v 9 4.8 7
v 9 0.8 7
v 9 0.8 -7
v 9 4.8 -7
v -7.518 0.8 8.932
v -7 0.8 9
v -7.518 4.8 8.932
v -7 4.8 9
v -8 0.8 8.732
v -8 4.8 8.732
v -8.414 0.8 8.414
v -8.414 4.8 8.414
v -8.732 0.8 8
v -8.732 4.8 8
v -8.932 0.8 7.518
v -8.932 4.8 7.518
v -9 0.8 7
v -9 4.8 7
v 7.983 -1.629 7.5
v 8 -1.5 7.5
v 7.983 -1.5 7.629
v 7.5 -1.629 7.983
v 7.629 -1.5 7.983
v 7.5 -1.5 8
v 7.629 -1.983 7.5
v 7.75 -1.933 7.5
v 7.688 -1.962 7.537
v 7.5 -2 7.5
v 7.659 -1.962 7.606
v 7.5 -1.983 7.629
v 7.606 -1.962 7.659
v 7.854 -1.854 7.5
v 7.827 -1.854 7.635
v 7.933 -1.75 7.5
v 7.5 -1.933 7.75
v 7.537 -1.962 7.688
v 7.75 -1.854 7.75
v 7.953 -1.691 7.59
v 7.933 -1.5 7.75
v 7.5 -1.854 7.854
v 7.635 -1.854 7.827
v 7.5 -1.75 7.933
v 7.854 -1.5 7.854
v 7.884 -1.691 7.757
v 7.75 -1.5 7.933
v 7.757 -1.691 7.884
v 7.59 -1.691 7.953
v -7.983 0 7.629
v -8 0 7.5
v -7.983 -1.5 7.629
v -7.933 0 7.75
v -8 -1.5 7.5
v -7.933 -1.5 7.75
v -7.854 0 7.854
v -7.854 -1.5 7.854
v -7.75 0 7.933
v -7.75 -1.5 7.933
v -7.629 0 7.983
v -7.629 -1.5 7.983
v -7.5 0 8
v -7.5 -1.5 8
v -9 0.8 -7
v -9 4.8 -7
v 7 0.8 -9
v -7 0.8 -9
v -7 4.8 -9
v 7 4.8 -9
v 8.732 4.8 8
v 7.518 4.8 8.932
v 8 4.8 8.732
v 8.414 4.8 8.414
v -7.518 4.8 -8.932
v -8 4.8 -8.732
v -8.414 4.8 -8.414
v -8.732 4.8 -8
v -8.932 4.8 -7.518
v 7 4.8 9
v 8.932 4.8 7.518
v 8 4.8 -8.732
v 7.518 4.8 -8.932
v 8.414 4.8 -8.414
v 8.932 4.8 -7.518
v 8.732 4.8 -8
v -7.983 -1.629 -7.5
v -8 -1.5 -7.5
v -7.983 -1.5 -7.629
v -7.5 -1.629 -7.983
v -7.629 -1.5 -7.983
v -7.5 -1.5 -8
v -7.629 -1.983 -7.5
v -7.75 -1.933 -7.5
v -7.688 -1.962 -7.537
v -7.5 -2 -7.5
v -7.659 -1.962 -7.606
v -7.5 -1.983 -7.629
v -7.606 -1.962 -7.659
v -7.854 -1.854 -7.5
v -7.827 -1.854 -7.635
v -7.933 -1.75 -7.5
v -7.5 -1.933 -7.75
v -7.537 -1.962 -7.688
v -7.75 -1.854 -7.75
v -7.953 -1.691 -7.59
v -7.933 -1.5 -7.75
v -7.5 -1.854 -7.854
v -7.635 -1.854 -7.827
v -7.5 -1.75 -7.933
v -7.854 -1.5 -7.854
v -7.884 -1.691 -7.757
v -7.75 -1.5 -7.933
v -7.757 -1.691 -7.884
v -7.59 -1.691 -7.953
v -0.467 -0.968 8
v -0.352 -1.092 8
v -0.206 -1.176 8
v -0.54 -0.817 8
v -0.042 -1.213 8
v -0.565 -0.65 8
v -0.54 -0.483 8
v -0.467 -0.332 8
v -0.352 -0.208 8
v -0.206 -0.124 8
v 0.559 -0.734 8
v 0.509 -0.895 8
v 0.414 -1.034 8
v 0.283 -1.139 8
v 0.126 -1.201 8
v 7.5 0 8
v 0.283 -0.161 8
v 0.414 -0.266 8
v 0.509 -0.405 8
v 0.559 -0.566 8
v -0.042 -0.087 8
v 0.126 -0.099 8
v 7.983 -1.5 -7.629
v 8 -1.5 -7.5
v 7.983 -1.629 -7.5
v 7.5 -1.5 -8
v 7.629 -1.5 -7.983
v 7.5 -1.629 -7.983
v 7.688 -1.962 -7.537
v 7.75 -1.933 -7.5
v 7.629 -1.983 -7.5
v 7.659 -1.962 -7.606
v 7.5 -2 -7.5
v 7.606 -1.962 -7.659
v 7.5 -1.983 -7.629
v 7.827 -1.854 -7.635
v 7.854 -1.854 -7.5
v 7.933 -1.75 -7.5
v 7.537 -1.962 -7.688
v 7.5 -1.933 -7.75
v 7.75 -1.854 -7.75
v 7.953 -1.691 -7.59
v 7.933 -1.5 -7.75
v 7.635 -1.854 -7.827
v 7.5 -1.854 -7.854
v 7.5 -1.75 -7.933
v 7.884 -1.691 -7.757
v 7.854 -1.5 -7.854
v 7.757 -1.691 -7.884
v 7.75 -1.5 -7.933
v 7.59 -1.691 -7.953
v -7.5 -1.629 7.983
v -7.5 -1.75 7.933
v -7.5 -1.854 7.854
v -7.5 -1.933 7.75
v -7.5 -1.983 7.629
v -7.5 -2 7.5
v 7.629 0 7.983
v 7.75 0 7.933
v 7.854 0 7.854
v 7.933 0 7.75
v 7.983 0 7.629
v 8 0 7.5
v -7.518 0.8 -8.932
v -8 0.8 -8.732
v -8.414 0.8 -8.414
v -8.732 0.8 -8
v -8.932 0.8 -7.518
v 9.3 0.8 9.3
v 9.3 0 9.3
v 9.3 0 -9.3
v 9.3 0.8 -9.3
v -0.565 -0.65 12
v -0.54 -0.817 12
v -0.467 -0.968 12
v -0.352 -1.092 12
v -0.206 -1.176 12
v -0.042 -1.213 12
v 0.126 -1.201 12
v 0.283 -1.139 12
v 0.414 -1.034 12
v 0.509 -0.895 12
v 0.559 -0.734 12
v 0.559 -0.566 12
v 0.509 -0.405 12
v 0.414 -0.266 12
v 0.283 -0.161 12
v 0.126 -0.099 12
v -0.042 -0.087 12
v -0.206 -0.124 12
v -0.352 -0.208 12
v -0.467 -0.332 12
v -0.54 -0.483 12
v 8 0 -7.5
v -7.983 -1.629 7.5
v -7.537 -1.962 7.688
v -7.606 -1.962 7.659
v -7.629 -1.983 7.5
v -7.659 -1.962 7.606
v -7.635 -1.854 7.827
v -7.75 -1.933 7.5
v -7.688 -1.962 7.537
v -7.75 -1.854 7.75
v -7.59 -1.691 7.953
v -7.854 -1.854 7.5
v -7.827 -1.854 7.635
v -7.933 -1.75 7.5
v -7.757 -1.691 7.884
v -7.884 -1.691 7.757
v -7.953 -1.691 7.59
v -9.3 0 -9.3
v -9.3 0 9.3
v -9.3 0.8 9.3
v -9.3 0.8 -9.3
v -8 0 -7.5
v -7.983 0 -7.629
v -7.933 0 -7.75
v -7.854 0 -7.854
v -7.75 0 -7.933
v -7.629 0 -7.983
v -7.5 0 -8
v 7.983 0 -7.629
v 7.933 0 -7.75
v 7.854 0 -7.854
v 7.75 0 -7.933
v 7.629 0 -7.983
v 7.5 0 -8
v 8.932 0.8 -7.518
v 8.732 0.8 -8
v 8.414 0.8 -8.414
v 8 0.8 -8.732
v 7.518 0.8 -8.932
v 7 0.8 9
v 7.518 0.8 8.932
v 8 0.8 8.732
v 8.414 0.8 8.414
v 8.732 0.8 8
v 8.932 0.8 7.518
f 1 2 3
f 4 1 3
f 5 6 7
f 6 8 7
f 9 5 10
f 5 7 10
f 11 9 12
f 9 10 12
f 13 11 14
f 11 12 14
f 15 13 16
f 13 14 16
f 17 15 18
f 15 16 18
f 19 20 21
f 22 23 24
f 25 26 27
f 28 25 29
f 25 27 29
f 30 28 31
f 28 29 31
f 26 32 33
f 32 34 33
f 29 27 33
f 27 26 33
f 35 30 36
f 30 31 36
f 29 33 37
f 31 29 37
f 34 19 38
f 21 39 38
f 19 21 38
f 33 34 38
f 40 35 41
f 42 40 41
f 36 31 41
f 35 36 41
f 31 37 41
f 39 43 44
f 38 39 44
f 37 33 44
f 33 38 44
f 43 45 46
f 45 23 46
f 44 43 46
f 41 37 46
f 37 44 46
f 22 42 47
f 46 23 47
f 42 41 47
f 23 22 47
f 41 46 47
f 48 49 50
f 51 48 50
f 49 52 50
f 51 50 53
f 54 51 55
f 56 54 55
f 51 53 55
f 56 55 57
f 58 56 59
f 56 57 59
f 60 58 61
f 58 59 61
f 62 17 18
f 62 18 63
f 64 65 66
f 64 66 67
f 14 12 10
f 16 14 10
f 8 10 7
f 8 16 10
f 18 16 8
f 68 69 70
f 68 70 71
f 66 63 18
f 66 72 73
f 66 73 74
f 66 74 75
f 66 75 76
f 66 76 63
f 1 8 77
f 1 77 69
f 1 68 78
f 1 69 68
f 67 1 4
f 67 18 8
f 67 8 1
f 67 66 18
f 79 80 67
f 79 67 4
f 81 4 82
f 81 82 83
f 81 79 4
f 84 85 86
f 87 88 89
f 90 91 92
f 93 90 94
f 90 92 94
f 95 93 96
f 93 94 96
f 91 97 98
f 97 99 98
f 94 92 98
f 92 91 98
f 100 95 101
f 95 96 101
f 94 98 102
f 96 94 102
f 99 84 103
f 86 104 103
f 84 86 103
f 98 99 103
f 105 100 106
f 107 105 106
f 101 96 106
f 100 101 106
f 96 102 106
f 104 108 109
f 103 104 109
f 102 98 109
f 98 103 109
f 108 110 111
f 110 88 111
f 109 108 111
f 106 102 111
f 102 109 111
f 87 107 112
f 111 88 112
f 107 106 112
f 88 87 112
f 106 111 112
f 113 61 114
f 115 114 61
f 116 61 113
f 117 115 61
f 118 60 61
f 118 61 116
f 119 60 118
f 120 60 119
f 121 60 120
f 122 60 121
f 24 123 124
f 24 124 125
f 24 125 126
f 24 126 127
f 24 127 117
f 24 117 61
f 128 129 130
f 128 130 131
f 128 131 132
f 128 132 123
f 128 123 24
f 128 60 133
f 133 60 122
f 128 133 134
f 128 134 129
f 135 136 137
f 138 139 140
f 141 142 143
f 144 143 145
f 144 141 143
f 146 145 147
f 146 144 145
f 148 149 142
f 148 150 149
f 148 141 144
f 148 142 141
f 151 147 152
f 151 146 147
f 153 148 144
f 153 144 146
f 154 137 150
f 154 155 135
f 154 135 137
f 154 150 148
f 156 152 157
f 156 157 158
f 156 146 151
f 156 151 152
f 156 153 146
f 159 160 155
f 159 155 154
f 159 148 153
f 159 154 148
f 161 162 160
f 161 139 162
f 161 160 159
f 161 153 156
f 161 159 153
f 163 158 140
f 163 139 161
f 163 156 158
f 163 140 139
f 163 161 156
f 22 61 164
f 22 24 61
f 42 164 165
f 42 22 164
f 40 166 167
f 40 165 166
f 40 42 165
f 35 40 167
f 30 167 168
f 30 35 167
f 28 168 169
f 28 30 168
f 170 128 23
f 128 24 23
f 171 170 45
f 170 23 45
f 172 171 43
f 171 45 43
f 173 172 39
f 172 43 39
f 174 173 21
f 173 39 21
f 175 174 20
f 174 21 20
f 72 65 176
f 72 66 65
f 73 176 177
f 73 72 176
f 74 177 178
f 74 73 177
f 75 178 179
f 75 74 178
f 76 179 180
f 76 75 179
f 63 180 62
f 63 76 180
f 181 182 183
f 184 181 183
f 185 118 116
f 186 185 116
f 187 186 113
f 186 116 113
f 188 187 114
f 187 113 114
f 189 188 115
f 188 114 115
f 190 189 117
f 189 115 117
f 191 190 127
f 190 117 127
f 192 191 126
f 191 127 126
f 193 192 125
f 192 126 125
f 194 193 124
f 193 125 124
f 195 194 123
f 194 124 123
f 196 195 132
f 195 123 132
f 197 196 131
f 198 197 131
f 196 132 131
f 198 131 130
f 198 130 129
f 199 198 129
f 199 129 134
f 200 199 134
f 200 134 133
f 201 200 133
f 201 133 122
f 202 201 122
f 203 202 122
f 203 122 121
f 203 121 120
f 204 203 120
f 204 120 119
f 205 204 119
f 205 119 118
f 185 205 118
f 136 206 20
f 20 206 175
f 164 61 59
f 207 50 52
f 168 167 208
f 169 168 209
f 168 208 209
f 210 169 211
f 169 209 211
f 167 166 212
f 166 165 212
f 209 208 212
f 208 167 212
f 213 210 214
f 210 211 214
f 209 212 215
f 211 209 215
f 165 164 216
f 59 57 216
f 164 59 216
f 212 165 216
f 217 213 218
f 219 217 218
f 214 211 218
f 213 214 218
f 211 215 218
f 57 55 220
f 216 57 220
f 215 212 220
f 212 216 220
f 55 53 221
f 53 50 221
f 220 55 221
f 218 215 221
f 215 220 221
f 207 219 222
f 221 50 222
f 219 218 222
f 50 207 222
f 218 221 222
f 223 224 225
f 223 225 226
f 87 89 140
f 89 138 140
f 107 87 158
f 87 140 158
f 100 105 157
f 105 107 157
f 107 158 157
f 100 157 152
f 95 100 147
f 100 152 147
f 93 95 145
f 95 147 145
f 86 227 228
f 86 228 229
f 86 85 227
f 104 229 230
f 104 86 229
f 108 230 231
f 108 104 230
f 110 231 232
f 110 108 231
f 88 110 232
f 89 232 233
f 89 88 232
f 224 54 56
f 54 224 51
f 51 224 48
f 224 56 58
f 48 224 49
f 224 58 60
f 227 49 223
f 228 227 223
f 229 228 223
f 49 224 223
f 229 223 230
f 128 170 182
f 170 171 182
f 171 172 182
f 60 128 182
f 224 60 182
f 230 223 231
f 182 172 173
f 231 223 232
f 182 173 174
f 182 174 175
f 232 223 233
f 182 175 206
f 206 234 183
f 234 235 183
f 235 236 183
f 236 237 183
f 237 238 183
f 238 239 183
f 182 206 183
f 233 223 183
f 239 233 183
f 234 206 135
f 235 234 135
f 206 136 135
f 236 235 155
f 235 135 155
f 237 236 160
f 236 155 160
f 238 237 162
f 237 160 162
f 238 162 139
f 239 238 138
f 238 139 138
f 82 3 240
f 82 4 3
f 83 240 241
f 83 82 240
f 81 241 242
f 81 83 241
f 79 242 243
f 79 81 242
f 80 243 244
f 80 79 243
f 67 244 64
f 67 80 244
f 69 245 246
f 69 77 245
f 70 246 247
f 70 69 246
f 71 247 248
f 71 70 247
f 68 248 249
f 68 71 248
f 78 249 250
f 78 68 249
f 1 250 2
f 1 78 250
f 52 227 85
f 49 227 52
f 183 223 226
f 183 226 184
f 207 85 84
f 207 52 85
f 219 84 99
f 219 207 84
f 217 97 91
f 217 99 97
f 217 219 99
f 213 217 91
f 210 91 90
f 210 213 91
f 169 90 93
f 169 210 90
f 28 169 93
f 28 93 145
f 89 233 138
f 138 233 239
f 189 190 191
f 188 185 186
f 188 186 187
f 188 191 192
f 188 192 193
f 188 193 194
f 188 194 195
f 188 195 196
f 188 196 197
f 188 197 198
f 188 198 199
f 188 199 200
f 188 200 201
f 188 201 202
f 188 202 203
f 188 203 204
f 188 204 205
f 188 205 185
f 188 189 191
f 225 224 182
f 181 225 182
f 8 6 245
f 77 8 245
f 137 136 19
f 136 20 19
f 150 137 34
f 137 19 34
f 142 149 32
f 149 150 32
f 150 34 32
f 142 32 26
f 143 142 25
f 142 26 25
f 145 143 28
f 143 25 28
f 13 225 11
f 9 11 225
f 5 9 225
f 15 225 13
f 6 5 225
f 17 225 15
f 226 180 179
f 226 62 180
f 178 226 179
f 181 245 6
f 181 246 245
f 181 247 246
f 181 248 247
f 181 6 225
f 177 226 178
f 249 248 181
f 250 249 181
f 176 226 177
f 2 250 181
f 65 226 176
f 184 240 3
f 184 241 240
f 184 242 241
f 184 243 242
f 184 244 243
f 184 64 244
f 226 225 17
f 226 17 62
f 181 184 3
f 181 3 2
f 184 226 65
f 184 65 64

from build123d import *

# Parameters (mm, degrees)
SKETCH1_W    = 18.6
SKETCH1_H    = 18.6
PCB_DEPTH    = 0.8
SKETCH2_W    = 18
SKETCH2_H    = 18
PATCH_DEPTH  = 4
SKETCH3_W    = 16
SKETCH3_H    = 16
RADOME_DEPTH = 2
FILLET1_R    = 2
FILLET2_R    = 0.5
SKETCH4_R    = 0.565
CABLE_DEPTH  = 12


with BuildPart() as part:
    # Sketch1 → PCB (new body)
    with BuildSketch(Plane(origin=(0, 0, 0), x_dir=(1, 0, 0), z_dir=(0, 1, 0))):
        Rectangle(SKETCH1_W, SKETCH1_H)
    extrude(amount=PCB_DEPTH)

    # Sketch2 → PATCH (add)
    with BuildSketch(Plane(origin=(0, 0.8, 0), x_dir=(1, 0, 0), z_dir=(0, 1, 0))):
        Rectangle(SKETCH2_W, SKETCH2_H)
    extrude(amount=PATCH_DEPTH)

    # Sketch3 → RADOME (add)
    with BuildSketch(Plane.XZ):
        Rectangle(SKETCH3_W, SKETCH3_H)
    extrude(amount=RADOME_DEPTH)

    # Fillet1
    fillet1_edges = [part.edges().sort_by_distance(p)[0] for p in [
        (9, 2.8, 9),
        (9, 2.8, -9),
        (-9, 2.8, -9),
        (-9, 2.8, 9),
    ]]
    fillet(fillet1_edges, radius=FILLET1_R)

    # Fillet2
    fillet2_edges = [part.edges().sort_by_distance(p)[0] for p in [
        (8, -1, -8),
        (8, -1, 8),
        (-8, -1, 8),
        (-8, -1, -8),
        (8, -2, 0),
        (0, -2, 8),
        (-8, -2, 0),
        (0, -2, -8),
    ]]
    fillet(fillet2_edges, radius=FILLET2_R)

    # Sketch4 → CABLE (add)
    with BuildSketch(Plane.XY):
        with Locations(Location((0, -0.65, 0), (0, 0, 180))):
            Circle(SKETCH4_R)
    extrude(amount=CABLE_DEPTH)


solid = part.part
